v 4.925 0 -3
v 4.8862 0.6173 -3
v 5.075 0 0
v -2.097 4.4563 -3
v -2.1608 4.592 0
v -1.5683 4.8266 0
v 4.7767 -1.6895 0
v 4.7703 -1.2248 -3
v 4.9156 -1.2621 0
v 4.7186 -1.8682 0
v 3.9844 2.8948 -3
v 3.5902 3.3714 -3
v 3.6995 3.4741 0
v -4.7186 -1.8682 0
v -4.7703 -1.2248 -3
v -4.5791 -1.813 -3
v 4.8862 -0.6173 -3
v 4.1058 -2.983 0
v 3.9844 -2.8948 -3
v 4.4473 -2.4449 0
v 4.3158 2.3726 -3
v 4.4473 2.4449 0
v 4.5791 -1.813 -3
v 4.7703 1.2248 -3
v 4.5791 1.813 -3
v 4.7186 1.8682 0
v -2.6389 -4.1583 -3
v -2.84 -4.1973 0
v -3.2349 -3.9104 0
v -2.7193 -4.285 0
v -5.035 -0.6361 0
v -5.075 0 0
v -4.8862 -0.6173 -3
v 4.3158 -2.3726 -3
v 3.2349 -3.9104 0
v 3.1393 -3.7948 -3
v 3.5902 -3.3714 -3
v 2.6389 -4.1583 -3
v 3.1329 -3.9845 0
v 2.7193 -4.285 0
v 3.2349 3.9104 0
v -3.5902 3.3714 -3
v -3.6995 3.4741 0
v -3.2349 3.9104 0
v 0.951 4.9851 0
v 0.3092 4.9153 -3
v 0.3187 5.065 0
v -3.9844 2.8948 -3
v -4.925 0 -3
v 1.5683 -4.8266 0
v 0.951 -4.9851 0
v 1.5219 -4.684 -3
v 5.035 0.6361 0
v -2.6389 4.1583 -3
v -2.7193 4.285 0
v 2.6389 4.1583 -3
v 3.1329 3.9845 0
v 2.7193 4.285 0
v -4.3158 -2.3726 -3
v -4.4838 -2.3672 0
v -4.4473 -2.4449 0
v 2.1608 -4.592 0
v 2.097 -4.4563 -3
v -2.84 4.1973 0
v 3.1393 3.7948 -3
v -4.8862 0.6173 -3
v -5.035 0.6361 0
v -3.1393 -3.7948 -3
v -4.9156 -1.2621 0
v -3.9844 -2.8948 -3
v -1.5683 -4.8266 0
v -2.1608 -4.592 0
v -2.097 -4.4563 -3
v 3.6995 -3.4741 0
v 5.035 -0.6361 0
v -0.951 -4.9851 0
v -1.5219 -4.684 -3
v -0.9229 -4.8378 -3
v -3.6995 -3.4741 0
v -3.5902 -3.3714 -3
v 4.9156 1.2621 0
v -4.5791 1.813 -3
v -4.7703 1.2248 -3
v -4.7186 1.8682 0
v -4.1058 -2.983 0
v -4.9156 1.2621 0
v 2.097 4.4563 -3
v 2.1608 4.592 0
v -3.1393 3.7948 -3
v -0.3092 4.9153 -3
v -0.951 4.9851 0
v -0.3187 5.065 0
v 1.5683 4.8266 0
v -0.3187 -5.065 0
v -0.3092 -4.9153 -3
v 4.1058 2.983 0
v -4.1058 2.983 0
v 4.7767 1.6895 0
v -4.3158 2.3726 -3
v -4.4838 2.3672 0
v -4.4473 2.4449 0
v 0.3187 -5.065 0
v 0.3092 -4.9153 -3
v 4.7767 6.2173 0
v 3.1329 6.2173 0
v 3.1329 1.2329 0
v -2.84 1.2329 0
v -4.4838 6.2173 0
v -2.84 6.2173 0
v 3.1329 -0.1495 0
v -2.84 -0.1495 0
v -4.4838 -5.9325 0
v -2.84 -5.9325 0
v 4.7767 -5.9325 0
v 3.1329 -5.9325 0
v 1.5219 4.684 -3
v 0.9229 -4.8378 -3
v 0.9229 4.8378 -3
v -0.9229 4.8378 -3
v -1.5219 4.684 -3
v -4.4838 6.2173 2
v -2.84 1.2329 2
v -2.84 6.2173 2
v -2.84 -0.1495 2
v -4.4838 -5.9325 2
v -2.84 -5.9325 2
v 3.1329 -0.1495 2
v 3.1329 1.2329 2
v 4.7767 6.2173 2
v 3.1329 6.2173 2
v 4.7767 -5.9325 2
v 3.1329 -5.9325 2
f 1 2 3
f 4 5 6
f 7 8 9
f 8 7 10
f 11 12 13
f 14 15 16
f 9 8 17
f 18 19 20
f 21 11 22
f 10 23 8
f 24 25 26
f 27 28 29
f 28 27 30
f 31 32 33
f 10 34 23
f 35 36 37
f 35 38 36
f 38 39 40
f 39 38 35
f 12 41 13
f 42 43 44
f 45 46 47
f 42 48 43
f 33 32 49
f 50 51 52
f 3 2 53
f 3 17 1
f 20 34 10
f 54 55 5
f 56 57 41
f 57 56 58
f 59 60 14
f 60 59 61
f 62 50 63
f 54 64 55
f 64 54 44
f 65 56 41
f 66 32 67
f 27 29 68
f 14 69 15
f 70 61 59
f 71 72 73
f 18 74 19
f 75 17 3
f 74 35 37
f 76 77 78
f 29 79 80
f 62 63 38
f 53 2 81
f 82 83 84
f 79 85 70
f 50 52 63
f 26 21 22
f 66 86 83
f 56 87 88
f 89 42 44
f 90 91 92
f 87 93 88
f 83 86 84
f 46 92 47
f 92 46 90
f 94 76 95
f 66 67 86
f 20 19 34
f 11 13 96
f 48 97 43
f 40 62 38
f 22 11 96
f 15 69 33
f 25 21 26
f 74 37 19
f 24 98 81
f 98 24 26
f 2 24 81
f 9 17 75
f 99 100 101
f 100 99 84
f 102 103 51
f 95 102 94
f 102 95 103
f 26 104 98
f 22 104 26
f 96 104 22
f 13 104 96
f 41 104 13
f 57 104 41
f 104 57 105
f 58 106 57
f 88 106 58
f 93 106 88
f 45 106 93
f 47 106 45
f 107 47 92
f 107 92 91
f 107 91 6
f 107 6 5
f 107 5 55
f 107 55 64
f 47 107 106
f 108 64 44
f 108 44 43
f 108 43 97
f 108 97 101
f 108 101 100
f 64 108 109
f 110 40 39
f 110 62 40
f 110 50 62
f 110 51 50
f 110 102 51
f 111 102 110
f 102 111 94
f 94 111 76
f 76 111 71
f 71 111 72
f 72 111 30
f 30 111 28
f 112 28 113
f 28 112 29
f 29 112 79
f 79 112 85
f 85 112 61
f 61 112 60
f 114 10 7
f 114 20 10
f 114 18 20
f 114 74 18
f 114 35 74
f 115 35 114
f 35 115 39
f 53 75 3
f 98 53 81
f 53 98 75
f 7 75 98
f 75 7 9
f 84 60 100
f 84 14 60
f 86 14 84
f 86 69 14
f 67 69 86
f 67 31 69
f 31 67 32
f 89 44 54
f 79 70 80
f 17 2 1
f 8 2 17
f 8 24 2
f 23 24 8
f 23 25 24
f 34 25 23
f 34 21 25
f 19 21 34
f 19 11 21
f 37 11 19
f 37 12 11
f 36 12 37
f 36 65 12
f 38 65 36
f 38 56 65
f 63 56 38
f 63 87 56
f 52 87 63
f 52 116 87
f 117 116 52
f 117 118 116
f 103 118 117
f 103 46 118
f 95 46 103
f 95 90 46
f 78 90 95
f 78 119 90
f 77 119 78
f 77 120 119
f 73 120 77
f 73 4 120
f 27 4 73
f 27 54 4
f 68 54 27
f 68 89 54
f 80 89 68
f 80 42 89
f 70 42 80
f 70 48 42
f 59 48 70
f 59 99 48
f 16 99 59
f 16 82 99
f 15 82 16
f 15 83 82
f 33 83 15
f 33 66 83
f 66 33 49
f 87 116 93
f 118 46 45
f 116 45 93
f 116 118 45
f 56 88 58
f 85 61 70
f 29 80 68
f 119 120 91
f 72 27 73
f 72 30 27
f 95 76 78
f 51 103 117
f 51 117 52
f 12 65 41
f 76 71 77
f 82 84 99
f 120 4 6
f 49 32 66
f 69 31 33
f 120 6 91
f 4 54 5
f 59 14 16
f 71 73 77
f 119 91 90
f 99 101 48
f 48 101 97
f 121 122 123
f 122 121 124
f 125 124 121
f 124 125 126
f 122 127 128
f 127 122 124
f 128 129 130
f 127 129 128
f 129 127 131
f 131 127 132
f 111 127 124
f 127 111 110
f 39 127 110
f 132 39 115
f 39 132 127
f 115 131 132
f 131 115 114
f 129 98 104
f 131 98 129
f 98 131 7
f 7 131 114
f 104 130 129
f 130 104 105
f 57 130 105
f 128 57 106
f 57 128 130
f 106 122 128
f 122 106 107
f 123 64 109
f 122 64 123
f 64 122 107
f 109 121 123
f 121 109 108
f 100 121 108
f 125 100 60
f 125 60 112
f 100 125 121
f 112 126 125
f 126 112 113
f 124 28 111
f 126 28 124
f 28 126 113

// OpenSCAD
$fn = 50;

difference() {
	union() {
		translate(v = [0, 0, -3.0]) {
			cylinder(h = 3, r1 = 4.925, r2 = 5.075);
		}
		linear_extrude(height = 2) {
			text(font = "Impact", halign = "center", size = 12, text = "H", valign = "center");
		}
	}
	union();
}
